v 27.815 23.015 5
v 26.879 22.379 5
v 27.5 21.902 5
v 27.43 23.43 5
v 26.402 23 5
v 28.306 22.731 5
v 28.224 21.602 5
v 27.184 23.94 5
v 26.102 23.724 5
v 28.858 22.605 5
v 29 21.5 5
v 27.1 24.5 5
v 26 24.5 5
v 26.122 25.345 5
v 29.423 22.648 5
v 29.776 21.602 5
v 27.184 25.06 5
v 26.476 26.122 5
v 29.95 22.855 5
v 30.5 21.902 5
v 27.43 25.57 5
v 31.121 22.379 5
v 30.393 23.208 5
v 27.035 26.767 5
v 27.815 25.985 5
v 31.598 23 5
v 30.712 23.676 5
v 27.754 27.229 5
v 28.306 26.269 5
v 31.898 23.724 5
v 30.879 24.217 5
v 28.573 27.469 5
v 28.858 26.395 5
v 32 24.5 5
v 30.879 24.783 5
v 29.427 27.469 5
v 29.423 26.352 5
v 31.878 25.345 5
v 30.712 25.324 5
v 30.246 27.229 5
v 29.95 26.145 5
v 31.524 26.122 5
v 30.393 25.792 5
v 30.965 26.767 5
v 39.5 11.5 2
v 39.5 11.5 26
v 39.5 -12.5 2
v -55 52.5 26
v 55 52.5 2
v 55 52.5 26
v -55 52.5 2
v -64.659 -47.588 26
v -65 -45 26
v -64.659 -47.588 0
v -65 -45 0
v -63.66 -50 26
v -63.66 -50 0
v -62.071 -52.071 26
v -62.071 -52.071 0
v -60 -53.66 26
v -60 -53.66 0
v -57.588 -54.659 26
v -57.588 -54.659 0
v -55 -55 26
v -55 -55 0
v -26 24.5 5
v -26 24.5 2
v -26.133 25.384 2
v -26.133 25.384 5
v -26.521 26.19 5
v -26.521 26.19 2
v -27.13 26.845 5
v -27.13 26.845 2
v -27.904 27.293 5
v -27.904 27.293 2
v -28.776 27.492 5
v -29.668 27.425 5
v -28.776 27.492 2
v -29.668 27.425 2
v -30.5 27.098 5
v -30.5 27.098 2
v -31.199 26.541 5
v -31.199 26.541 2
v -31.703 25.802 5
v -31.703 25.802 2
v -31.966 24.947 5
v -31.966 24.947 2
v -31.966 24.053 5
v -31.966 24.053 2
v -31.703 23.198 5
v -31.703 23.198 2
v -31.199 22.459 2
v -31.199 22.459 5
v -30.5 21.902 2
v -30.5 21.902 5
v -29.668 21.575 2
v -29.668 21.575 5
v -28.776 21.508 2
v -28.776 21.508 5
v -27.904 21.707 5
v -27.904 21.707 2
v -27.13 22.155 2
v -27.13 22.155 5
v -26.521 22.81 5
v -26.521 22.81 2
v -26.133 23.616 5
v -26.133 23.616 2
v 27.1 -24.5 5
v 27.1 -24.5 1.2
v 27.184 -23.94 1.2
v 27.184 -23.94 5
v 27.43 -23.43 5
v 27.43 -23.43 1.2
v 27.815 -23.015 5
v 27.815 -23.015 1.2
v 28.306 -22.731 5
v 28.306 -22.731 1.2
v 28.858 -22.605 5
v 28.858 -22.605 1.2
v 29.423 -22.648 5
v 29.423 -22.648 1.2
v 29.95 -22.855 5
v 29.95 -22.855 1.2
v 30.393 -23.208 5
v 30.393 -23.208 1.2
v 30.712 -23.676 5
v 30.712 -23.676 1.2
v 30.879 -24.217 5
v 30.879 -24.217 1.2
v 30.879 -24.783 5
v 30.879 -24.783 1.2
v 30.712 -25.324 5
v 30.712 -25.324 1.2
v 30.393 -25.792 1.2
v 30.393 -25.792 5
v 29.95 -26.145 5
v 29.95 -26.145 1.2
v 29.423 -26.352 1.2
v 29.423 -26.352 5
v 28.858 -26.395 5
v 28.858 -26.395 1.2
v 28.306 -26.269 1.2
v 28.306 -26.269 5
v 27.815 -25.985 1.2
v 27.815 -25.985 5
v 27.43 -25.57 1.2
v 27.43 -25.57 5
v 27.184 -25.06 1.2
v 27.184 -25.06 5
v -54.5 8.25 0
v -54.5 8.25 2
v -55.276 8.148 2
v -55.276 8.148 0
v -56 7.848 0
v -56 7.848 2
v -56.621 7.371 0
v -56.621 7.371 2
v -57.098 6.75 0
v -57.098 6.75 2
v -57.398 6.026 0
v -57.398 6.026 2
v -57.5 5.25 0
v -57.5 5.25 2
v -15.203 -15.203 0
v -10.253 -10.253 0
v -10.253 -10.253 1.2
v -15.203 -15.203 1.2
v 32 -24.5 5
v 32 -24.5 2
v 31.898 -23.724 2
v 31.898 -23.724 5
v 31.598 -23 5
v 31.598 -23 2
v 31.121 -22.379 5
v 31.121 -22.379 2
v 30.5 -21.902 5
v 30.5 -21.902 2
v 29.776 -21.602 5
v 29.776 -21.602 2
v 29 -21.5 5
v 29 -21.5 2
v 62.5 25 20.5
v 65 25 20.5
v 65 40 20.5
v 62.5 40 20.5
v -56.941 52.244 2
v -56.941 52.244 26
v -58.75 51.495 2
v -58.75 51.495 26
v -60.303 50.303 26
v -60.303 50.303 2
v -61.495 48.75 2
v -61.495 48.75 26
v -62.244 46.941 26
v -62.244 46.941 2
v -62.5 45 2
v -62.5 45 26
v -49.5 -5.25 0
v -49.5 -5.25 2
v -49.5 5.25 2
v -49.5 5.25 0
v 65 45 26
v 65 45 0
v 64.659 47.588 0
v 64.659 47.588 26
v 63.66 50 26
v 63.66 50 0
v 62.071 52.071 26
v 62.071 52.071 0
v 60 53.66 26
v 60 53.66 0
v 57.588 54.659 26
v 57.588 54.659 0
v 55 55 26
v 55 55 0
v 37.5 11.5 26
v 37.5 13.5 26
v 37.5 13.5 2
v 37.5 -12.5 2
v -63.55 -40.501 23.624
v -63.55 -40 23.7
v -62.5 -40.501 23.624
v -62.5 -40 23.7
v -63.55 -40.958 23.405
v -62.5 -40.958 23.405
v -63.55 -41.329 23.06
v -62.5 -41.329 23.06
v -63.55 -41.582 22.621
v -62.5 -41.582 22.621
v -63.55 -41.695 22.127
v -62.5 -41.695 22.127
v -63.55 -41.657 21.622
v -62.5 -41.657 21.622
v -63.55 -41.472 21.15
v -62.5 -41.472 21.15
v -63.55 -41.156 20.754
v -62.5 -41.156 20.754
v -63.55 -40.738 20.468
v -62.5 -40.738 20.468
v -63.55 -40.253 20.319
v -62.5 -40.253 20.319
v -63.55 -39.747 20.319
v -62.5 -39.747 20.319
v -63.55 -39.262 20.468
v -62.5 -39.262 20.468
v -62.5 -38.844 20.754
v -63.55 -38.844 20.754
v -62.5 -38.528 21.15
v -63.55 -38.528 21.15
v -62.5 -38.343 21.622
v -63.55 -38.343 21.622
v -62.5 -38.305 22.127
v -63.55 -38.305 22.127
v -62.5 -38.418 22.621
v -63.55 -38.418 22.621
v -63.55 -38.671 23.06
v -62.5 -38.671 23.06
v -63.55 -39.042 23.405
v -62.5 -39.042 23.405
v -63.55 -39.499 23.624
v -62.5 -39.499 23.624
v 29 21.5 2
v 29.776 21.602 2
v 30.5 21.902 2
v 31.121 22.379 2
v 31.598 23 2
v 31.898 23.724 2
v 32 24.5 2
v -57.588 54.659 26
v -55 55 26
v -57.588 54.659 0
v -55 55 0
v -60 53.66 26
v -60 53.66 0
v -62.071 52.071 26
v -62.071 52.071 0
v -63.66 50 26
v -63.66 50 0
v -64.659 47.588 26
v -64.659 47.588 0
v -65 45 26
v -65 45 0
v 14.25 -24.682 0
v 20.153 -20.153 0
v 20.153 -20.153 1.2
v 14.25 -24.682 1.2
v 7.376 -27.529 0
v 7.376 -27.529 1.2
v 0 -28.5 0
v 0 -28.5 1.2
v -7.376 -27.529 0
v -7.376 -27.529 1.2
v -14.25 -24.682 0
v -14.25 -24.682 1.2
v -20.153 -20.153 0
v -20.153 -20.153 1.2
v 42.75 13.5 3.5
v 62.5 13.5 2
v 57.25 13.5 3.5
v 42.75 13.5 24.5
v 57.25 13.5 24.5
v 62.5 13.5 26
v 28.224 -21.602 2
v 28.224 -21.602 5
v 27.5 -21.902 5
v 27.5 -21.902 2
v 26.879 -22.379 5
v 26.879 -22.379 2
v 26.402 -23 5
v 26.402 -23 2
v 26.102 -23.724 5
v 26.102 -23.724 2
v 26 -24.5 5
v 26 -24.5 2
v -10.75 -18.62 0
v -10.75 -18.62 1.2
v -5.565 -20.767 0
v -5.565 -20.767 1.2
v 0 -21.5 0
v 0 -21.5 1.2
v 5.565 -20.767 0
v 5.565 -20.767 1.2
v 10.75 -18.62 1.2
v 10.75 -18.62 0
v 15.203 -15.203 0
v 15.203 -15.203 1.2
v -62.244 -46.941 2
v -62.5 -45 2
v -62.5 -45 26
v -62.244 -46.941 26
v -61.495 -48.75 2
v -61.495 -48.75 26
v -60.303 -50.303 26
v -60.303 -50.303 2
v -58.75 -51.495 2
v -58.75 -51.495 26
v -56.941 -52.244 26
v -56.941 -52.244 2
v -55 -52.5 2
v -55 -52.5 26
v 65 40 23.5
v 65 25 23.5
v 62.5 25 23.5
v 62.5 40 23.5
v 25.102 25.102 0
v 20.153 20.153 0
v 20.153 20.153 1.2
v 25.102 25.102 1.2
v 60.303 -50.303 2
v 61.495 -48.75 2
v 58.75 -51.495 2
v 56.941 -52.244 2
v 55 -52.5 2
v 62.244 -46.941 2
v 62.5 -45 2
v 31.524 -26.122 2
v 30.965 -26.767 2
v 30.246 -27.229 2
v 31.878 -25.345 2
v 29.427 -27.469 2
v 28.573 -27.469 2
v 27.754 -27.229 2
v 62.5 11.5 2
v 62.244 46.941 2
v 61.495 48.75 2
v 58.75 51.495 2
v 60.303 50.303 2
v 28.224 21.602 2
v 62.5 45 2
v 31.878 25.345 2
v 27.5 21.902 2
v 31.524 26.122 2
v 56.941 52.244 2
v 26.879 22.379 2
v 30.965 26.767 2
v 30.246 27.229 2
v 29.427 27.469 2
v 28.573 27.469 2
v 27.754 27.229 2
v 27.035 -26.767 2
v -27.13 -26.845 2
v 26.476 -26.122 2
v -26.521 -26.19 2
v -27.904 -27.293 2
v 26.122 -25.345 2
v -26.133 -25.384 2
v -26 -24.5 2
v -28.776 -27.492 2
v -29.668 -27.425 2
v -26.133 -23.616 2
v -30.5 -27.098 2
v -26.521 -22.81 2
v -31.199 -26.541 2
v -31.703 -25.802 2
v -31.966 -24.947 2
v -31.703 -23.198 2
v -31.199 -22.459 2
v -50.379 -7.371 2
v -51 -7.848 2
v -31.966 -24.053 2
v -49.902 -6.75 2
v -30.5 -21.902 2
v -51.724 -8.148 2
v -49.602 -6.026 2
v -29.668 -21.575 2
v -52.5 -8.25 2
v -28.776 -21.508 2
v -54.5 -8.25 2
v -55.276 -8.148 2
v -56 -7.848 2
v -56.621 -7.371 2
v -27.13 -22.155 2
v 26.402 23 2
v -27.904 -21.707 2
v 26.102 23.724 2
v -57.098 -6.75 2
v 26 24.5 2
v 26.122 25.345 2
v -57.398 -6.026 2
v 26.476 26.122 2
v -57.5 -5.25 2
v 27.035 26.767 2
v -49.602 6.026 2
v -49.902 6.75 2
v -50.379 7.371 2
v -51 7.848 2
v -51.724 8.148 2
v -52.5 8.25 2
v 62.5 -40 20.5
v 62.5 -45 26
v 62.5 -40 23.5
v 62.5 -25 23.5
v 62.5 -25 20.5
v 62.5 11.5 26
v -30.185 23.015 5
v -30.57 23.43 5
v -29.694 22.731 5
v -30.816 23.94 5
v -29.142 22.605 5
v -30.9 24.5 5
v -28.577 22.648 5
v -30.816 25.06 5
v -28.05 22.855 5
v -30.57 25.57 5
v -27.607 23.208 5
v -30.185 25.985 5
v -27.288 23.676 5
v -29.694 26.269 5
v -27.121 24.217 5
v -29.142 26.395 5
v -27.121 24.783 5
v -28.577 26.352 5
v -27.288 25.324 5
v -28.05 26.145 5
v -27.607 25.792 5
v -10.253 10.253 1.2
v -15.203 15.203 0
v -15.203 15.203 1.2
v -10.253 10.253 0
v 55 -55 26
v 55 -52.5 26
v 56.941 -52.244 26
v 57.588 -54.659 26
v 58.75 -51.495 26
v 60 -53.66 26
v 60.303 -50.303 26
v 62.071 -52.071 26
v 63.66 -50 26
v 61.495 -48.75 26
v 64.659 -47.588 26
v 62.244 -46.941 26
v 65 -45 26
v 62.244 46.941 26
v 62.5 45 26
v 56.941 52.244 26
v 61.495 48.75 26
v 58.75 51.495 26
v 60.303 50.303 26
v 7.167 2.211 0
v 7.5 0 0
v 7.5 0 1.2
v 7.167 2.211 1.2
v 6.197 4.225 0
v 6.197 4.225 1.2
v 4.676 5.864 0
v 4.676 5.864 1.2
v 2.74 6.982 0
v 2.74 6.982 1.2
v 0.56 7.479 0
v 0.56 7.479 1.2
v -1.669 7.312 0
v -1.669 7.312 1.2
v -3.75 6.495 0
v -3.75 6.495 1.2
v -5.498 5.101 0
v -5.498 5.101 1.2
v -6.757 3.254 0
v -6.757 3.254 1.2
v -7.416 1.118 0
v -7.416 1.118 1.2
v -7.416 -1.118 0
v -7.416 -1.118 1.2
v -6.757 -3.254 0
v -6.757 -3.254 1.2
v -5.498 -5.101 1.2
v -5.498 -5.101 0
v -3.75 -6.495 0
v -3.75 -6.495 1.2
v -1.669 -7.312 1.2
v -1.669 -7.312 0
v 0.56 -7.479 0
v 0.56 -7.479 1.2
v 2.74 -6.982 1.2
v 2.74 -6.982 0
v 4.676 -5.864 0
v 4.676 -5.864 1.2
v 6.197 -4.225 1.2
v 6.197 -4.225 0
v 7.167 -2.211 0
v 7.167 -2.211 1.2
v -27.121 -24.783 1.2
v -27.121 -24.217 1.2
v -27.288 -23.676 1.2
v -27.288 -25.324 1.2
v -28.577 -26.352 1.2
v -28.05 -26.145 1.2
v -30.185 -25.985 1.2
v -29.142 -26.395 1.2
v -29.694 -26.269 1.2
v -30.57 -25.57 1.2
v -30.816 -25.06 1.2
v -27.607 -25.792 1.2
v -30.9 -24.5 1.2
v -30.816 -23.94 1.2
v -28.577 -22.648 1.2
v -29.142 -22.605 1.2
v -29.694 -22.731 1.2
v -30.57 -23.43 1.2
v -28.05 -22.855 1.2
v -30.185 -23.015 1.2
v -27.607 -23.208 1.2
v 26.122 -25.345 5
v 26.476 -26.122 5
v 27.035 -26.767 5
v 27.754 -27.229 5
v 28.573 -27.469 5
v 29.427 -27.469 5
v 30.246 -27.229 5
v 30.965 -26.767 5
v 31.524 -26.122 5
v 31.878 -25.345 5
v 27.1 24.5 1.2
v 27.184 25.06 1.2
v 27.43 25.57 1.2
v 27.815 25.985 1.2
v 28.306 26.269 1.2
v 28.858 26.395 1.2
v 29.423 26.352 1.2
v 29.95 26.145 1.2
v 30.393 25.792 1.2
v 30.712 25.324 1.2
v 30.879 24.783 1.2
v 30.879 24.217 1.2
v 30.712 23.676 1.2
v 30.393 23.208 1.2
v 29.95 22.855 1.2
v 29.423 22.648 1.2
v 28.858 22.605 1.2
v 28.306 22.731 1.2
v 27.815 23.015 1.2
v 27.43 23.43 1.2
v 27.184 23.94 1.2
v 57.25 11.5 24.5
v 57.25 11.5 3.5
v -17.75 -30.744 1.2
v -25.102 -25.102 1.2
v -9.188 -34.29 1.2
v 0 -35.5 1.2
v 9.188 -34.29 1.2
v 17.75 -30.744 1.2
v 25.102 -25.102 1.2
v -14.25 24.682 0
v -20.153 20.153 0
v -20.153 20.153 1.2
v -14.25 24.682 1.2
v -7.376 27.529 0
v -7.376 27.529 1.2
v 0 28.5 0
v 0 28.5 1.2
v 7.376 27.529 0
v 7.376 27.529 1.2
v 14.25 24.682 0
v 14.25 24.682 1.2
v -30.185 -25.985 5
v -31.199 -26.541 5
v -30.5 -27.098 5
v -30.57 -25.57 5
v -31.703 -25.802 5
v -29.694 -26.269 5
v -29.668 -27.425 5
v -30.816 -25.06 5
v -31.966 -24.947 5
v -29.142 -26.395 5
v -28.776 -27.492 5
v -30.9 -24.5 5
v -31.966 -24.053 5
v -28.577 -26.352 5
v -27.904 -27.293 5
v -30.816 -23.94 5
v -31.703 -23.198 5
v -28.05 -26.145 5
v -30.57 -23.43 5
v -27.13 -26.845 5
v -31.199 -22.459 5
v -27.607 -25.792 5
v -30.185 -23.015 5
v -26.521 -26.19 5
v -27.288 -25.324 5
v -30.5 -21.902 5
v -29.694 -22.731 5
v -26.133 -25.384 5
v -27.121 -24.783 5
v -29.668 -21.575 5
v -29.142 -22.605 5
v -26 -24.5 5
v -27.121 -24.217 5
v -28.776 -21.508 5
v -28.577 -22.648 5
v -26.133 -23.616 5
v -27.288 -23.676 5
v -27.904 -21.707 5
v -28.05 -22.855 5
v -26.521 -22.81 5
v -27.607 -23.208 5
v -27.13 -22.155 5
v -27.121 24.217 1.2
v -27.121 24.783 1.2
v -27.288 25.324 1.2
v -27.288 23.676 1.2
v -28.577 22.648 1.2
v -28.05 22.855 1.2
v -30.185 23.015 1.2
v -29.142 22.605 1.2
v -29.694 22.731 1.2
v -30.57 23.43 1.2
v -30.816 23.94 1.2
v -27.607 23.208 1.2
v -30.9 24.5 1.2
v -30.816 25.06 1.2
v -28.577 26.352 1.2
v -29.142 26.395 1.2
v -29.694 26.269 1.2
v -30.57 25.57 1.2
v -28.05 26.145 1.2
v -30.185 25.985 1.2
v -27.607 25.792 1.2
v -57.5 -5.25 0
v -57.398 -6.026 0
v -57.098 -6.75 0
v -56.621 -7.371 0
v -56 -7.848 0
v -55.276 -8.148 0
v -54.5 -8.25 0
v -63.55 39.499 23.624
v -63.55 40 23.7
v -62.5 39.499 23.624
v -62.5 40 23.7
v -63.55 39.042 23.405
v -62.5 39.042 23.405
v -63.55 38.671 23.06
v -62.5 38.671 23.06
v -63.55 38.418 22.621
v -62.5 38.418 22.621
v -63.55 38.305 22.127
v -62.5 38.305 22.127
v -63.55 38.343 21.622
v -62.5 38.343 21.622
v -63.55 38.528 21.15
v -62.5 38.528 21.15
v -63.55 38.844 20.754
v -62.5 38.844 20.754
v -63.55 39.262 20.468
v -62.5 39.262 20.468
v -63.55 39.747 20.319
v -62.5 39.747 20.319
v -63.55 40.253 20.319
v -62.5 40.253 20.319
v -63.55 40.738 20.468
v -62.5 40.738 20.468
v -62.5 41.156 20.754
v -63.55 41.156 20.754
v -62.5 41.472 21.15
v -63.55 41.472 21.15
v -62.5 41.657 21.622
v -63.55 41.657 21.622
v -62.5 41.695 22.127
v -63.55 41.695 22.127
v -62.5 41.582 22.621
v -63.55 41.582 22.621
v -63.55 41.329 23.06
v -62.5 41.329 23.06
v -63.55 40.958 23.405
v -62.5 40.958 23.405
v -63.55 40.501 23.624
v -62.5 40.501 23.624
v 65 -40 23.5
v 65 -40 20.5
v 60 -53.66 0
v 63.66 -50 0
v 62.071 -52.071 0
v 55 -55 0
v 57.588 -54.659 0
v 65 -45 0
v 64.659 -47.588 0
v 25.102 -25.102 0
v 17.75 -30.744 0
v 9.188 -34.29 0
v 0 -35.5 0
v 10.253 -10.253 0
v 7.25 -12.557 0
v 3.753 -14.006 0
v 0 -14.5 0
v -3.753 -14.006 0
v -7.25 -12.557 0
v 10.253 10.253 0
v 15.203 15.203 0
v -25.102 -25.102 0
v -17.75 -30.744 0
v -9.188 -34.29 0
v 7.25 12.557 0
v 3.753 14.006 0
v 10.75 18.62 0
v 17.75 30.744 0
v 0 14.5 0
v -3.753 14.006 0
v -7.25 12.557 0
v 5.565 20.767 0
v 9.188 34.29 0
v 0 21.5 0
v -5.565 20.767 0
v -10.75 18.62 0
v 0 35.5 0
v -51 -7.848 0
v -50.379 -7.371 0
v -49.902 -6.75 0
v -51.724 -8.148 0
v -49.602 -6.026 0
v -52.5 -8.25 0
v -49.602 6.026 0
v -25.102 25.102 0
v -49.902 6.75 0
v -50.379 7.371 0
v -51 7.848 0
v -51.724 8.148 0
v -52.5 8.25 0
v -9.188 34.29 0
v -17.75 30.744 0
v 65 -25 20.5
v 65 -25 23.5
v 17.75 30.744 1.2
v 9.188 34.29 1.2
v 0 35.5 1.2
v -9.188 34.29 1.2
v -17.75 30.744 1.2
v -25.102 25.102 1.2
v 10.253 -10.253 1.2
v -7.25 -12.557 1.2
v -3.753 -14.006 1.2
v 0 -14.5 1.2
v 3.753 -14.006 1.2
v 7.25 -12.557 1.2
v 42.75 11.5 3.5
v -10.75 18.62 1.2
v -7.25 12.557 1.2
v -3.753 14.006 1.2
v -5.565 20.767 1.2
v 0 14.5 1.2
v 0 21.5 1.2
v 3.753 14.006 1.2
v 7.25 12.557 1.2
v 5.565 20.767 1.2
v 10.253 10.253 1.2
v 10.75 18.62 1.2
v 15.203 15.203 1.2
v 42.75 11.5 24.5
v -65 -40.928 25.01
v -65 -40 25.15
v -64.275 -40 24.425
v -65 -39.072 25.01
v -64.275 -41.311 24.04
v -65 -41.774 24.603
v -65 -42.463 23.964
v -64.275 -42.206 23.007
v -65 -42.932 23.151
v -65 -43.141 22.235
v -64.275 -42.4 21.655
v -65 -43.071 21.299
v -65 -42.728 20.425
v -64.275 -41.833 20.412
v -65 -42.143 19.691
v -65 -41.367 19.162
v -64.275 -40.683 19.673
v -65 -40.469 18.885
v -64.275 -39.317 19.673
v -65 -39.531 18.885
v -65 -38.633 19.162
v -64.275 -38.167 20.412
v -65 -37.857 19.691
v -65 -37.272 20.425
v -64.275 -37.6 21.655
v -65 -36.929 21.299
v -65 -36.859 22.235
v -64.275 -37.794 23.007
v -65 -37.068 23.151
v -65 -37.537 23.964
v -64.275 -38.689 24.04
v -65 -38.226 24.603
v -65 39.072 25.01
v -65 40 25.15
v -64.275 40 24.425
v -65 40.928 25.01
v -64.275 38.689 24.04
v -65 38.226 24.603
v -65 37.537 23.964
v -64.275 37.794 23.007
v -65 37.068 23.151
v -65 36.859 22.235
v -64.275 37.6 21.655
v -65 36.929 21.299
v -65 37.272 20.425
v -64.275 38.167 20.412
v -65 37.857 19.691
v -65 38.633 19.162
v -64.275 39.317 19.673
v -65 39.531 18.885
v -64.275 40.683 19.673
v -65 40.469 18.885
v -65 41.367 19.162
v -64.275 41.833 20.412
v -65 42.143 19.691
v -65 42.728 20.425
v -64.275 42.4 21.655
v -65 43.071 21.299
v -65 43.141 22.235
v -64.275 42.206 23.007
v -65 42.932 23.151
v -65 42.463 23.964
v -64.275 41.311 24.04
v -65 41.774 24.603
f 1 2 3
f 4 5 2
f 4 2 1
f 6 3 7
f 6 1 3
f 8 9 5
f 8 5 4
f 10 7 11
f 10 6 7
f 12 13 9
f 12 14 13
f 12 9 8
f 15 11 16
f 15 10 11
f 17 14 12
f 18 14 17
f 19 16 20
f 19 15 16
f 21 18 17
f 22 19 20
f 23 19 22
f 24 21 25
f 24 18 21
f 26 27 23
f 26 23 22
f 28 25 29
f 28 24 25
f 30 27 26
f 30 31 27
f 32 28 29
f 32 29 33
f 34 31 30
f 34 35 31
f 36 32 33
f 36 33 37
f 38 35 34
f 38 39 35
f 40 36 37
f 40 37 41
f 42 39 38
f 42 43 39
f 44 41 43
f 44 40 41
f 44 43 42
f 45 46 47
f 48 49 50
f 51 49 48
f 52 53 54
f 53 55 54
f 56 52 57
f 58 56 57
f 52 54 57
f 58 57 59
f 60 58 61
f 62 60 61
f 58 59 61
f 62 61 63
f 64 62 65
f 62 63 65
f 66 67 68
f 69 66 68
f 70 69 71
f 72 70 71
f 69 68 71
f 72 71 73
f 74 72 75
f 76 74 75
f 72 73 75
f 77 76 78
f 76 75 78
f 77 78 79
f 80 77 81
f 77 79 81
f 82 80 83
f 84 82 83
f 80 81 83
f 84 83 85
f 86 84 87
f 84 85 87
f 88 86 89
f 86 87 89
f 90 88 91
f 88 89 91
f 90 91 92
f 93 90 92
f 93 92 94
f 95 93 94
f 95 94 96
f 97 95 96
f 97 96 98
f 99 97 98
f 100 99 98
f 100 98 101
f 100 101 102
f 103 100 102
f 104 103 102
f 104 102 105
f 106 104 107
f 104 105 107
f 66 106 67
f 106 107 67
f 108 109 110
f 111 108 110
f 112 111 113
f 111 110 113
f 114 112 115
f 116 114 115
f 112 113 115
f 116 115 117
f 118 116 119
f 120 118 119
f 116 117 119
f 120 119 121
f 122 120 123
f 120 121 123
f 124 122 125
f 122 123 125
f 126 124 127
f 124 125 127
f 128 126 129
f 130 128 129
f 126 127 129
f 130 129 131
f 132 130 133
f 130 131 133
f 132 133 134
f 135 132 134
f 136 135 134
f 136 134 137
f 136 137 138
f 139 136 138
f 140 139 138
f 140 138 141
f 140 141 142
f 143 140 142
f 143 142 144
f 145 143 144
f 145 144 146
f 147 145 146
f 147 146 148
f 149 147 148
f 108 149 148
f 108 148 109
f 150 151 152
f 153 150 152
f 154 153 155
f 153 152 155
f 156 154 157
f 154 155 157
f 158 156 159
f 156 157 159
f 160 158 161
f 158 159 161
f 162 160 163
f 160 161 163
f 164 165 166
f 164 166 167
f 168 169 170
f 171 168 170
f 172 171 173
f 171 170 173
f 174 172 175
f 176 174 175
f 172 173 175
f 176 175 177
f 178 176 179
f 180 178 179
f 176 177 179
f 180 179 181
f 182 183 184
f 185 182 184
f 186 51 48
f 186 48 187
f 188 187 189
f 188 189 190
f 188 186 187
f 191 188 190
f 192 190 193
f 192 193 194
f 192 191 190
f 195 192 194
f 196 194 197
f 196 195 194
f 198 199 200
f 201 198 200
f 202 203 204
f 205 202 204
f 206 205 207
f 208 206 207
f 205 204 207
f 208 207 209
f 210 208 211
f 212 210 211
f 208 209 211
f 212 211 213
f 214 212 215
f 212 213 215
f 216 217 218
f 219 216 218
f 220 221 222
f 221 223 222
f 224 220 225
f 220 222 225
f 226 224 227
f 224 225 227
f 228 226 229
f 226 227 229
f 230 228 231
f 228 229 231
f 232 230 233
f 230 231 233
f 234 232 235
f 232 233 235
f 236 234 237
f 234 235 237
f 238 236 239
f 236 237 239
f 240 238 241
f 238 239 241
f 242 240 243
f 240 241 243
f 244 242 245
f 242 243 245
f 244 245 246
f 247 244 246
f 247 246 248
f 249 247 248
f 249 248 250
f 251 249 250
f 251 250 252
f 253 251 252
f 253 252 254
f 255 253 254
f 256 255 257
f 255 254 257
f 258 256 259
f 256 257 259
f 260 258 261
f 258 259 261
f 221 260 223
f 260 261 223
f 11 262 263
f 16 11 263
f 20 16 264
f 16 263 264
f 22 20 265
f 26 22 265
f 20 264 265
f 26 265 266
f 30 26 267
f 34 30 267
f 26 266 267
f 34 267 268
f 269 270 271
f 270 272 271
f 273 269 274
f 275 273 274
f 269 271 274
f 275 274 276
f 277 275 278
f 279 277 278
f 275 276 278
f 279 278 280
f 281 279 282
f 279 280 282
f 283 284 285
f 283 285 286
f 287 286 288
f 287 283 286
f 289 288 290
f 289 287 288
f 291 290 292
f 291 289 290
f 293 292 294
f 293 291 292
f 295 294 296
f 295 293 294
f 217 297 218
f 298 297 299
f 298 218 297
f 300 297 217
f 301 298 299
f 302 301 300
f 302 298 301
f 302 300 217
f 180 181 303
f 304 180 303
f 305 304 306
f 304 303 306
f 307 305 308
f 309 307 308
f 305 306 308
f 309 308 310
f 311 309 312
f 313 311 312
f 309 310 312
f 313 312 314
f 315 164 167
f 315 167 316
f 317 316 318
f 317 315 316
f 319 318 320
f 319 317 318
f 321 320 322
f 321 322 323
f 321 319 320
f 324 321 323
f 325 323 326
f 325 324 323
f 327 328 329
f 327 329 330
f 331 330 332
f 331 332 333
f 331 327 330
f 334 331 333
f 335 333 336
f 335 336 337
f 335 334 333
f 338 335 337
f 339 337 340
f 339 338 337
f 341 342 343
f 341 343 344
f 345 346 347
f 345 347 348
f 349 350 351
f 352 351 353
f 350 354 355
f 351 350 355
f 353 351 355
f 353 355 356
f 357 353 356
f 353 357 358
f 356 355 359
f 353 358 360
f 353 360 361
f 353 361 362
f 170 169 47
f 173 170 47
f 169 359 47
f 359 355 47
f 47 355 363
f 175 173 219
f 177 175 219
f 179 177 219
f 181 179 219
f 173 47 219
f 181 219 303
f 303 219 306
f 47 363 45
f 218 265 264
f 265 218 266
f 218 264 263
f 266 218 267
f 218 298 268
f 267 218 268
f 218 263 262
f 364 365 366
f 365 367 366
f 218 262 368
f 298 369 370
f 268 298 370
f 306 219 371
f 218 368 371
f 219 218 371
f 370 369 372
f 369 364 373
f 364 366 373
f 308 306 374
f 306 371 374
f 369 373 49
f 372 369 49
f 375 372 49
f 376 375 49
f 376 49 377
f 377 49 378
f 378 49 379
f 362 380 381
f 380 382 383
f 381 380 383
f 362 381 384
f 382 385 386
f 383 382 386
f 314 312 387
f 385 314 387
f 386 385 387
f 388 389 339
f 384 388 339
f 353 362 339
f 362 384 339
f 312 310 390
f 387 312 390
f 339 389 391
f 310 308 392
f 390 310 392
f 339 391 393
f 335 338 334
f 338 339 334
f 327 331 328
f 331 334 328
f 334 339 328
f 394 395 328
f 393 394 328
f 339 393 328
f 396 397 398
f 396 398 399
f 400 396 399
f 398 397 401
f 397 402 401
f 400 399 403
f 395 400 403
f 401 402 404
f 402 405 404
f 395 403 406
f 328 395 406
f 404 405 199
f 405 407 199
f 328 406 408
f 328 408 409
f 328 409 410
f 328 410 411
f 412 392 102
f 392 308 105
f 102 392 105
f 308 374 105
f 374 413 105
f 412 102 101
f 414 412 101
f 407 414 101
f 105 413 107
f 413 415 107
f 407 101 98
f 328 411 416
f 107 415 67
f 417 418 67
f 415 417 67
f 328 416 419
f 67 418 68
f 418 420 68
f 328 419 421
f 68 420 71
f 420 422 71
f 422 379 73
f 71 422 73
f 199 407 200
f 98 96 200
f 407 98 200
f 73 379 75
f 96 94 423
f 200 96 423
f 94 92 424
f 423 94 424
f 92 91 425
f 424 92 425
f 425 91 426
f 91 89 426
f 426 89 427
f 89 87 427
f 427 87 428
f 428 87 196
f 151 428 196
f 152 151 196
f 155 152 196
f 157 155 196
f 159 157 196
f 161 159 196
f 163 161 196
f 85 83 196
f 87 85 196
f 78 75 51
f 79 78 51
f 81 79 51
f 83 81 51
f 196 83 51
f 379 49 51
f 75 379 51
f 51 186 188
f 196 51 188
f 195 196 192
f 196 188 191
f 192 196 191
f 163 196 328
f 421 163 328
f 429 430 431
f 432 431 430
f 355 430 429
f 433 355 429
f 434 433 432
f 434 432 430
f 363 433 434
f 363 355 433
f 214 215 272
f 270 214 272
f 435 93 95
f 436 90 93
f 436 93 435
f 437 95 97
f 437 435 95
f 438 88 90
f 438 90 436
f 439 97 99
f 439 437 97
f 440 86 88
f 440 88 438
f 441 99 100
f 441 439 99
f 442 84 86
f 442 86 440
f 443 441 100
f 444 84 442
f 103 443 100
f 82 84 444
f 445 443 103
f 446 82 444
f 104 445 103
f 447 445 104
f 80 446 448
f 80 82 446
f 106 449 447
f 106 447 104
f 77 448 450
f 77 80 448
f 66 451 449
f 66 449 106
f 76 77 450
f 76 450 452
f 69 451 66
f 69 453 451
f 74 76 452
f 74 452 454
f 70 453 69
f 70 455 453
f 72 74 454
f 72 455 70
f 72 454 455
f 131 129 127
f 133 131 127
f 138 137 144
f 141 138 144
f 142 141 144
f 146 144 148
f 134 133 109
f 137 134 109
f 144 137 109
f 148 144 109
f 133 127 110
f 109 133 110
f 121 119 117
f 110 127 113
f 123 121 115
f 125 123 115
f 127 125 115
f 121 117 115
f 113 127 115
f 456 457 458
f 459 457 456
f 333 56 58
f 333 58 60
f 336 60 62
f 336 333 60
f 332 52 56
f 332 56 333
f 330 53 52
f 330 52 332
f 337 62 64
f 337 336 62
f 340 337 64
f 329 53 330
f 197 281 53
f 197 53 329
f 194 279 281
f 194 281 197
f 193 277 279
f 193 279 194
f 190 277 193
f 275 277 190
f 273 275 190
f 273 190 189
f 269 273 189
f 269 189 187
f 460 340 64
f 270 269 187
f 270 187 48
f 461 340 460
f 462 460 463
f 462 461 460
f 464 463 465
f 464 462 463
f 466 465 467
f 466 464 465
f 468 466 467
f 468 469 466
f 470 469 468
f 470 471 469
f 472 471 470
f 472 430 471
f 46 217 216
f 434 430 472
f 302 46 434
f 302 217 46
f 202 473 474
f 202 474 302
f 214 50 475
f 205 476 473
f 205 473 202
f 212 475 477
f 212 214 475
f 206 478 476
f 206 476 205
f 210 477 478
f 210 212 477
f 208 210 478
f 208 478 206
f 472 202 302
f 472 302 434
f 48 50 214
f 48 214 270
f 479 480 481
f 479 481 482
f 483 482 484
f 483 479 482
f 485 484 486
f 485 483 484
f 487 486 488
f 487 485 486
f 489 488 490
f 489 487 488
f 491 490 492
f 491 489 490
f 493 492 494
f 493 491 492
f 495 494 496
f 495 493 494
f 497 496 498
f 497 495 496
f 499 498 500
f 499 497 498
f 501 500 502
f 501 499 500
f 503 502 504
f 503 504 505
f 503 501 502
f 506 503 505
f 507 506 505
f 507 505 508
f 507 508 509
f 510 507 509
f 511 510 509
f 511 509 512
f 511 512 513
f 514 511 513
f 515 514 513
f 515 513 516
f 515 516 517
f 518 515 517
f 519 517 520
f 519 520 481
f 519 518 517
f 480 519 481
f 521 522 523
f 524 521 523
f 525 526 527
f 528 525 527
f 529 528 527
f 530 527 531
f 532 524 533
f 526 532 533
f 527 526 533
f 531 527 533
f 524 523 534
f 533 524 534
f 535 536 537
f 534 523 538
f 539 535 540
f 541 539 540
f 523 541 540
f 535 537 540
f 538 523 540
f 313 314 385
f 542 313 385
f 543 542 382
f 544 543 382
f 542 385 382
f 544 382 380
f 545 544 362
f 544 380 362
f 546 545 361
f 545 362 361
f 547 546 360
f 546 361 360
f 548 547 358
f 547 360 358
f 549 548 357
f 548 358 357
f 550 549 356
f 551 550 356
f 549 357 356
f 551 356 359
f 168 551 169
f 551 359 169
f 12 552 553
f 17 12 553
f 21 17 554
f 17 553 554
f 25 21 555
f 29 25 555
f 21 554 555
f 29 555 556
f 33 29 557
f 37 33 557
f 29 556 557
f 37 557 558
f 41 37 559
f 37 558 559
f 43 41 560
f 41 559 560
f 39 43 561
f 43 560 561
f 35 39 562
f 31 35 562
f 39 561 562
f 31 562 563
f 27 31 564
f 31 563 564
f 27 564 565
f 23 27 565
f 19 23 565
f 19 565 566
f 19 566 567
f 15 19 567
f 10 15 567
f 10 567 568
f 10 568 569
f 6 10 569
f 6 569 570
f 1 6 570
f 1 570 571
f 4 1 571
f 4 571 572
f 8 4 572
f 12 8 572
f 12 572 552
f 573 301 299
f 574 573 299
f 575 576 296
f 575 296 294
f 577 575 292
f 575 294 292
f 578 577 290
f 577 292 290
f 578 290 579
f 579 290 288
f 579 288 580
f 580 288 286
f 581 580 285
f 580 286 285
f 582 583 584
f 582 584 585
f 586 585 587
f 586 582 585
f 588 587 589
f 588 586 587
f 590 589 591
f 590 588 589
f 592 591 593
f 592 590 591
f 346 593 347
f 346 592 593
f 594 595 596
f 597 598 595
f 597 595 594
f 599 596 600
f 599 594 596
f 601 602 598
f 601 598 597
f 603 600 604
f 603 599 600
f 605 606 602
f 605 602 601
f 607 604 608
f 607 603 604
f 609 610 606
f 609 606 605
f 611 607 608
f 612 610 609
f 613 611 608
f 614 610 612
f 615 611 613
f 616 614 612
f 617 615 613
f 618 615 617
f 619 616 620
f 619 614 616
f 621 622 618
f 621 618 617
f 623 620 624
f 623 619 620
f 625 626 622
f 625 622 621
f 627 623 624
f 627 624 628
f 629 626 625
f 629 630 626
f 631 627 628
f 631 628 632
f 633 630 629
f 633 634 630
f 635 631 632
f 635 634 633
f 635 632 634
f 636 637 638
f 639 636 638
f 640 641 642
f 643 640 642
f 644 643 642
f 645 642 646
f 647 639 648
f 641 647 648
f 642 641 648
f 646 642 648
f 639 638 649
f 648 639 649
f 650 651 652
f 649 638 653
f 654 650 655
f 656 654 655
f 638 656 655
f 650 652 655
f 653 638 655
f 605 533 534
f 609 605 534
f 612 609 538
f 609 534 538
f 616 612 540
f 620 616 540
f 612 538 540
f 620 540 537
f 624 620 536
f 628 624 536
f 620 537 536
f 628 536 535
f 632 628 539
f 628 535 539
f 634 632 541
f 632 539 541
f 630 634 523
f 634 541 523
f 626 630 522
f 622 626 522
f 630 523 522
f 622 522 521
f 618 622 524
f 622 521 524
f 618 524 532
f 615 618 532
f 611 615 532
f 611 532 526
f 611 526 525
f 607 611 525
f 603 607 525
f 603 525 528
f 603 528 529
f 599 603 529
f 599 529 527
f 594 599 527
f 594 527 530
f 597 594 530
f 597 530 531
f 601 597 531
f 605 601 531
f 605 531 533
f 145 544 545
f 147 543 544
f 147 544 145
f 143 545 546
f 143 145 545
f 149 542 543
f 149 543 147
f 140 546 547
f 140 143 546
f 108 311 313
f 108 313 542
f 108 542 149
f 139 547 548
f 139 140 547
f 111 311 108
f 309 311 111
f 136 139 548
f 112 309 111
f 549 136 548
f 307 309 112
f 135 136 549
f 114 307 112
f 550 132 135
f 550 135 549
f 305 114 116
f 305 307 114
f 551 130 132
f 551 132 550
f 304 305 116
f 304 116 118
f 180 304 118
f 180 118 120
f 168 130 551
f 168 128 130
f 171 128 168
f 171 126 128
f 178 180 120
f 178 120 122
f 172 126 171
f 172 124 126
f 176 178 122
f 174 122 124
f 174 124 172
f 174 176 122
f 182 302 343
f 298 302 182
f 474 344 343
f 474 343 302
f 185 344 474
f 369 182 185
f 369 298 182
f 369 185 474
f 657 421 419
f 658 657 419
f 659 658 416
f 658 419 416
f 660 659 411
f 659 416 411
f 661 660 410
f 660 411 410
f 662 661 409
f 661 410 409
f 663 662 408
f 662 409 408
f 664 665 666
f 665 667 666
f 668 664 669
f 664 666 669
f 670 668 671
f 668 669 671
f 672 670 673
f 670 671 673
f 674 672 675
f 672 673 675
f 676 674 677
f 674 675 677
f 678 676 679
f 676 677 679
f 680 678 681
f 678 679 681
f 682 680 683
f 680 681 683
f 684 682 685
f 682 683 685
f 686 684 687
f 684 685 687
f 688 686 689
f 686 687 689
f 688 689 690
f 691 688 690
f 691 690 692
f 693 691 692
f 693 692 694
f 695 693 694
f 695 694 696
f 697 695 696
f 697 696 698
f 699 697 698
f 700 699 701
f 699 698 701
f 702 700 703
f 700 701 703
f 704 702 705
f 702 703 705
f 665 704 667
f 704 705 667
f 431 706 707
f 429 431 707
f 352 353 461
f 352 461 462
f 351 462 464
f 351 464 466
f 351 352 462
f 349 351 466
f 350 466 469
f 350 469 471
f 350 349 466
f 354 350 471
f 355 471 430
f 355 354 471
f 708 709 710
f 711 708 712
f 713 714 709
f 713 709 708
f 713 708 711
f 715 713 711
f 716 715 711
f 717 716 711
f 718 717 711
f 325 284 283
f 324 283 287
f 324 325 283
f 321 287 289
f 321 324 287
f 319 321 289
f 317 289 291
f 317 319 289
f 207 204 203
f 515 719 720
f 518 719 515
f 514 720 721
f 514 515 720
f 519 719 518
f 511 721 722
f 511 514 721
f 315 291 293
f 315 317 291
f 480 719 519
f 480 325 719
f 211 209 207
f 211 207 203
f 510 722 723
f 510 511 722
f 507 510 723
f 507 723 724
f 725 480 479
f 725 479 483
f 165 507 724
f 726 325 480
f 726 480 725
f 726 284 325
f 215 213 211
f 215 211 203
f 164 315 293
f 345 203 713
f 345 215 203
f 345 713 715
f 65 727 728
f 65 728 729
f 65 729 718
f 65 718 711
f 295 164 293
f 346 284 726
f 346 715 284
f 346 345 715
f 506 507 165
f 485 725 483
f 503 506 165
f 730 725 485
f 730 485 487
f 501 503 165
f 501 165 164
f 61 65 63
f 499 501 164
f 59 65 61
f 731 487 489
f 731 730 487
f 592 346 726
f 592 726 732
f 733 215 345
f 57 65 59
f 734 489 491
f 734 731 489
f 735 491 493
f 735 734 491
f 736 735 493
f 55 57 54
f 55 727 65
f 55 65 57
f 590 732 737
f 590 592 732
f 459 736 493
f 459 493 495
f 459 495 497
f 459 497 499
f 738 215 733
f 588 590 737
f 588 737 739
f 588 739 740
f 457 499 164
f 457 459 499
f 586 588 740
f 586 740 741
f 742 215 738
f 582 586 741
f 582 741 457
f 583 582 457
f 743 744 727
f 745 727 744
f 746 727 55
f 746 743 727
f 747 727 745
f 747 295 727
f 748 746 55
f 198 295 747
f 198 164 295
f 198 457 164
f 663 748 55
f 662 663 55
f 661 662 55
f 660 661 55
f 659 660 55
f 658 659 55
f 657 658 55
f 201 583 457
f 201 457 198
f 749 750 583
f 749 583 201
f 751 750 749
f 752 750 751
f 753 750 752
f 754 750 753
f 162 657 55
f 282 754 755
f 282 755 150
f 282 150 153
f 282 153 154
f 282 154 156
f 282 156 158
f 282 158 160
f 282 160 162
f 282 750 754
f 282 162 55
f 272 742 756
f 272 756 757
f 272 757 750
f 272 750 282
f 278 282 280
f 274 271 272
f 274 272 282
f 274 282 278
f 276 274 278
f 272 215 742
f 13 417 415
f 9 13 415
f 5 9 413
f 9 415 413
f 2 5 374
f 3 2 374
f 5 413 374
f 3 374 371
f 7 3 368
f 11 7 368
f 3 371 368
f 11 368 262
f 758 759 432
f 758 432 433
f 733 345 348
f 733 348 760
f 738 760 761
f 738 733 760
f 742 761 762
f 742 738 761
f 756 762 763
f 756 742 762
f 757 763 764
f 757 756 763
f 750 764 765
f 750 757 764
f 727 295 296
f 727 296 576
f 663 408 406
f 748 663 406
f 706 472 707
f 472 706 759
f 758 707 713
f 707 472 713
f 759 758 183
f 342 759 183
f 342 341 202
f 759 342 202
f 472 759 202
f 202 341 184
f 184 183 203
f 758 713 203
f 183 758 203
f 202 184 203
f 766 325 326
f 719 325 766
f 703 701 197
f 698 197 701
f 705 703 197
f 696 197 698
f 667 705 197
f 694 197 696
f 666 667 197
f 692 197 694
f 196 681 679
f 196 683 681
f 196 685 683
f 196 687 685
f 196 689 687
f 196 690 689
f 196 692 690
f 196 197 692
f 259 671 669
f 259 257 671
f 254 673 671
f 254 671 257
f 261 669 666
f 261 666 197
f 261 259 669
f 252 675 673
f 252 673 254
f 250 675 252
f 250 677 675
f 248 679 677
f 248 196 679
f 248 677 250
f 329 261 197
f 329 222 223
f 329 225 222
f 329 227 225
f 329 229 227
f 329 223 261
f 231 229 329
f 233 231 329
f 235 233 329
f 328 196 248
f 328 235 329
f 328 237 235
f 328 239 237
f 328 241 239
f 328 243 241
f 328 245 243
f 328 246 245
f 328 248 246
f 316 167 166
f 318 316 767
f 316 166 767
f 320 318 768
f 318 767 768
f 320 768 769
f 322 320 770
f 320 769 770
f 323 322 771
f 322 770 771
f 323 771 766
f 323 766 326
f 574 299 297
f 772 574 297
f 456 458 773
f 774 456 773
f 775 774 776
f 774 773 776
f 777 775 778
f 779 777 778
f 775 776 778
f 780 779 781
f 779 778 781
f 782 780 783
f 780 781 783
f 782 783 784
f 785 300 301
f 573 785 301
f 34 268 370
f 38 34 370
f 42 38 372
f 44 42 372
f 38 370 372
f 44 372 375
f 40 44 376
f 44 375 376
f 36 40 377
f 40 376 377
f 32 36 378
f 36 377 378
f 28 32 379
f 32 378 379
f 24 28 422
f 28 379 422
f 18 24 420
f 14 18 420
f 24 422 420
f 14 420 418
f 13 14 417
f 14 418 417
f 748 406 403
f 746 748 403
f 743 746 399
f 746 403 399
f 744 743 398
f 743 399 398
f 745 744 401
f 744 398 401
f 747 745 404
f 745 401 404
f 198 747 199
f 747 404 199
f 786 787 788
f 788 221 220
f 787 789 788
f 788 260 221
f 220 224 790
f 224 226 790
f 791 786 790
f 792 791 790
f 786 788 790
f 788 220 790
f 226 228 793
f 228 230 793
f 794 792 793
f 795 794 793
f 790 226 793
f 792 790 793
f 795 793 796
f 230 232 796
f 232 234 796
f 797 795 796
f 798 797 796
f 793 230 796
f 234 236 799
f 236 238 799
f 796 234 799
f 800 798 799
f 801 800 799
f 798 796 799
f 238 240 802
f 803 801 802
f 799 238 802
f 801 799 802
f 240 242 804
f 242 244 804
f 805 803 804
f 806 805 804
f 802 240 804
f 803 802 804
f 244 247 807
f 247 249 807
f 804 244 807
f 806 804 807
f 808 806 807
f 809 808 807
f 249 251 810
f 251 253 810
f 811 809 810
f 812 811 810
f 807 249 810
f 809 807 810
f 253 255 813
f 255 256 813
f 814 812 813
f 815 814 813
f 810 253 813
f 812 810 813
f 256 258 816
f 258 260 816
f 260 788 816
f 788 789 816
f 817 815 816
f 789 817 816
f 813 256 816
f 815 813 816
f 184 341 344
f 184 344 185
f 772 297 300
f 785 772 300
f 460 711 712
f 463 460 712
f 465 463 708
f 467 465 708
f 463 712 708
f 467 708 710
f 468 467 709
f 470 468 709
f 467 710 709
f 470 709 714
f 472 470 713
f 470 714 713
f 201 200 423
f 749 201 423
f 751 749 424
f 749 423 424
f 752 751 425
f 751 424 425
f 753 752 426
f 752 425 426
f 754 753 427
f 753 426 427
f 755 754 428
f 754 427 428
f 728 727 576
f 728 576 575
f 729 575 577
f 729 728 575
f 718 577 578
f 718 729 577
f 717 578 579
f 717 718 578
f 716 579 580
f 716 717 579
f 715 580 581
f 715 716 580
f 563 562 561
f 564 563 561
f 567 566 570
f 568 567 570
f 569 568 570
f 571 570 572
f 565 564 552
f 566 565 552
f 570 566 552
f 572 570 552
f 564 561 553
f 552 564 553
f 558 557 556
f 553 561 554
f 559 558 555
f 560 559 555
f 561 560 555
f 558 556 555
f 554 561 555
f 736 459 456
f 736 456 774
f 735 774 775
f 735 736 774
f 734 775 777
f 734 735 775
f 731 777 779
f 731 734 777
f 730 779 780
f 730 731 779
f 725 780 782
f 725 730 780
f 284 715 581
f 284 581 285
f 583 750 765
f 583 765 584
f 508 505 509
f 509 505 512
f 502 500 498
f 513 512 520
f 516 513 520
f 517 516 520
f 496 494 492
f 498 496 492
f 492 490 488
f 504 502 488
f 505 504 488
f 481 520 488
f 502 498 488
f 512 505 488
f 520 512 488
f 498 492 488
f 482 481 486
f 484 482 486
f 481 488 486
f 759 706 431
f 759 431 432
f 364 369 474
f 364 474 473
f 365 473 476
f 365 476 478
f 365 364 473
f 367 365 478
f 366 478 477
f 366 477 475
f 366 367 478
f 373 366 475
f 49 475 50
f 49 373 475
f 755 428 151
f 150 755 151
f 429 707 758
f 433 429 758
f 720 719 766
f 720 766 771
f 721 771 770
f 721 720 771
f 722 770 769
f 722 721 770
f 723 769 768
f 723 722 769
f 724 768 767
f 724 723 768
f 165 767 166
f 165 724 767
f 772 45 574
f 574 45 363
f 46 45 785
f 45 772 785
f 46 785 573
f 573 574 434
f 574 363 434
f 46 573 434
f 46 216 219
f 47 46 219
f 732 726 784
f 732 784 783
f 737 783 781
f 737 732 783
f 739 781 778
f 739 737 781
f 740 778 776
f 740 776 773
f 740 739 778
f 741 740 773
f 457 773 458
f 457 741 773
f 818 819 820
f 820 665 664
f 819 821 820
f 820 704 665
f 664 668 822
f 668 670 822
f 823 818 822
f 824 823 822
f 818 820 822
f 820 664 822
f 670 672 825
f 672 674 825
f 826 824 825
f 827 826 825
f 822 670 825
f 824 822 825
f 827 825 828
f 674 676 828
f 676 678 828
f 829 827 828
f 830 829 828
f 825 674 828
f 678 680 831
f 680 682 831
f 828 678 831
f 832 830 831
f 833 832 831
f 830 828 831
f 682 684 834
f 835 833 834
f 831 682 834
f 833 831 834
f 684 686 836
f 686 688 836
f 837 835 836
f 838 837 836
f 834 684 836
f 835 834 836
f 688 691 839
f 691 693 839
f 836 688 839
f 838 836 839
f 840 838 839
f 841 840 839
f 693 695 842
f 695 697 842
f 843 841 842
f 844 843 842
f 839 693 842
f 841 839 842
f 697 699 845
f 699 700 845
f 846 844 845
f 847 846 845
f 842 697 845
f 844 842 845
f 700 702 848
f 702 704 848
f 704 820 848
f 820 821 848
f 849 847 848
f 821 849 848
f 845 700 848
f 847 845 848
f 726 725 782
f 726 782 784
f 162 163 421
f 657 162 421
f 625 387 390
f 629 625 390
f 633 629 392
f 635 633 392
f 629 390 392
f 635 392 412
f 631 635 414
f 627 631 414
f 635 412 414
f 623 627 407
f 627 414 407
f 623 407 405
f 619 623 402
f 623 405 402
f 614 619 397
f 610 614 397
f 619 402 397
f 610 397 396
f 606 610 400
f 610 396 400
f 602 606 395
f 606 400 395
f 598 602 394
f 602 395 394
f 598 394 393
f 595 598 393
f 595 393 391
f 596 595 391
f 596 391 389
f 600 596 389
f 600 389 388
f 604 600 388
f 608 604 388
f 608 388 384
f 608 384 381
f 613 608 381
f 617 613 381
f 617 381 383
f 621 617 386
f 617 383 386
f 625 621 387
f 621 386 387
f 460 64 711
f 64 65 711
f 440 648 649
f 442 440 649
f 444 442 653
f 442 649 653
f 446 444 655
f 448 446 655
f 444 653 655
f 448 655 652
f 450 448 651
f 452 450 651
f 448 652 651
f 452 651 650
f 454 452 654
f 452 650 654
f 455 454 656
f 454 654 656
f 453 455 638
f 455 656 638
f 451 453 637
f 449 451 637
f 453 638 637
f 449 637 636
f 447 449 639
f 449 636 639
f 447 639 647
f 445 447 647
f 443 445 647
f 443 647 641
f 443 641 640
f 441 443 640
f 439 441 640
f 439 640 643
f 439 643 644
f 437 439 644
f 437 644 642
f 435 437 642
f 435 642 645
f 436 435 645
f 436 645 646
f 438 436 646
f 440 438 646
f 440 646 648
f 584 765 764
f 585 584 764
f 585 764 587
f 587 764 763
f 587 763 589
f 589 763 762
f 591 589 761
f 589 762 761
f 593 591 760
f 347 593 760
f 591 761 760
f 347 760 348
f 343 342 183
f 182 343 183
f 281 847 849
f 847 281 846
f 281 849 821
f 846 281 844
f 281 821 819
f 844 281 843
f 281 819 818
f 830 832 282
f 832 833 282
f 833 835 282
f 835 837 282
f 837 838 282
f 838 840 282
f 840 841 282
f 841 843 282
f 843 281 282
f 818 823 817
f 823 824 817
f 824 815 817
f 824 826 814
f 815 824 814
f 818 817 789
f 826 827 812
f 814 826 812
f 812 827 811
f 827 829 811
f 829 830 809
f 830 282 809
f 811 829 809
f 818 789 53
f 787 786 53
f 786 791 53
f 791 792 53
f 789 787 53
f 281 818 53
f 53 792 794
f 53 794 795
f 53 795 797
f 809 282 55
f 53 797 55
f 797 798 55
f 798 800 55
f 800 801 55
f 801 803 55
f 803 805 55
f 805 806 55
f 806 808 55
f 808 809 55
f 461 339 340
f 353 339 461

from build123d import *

# Parameters (mm, degrees)
P_IDAT_VYSUNUT_M1_DEPTH                           = 2
P_IDAT_VYSUNUT_M2_DEPTH                           = 24
SKICA6_R                                          = 3
P_IDAT_VYSUNUT_M3_DEPTH                           = 3
D_RY_PRO_KOL_K_VELIKOST_MM1_D                     = 3.8
D_RY_PRO_KOL_K_VELIKOST_MM1_DEPTH                 = 3.8
ODEBRAT_VYSUNUT_M1_DEPTH                          = 3
SKICA12_W                                         = 24
SKICA12_H                                         = 2
P_IDAT_VYSUNUT_M4_DEPTH                           = 25
P_IDAT_VYSUNUT_M5_DEPTH                           = 2
SKICA14_W                                         = 7.25
SKICA14_H                                         = 10.5
ODEBRAT_VYSUNUT_M2_DEPTH                          = 9.212713479
V_LCOV_ZAHLOUBEN_PRO_M3_ROUBY_S_PLOCH_D           = 3.4
V_LCOV_ZAHLOUBEN_PRO_M3_ROUBY_S_PLOCH_DEPTH       = 3.8
V_LCOV_ZAHLOUBEN_PRO_M3_ROUBY_S_PLOCH_CSINK_D     = 6.3
V_LCOV_ZAHLOUBEN_PRO_M3_ROUBY_S_PLOCH_CSINK_ANGLE = 90
V_LCOV_ZAHLOUBEN_PRO_M3_ROUBY_S_PLOCH_TIP         = 1.021463052
SKICA17_W                                         = 3
SKICA17_H                                         = 15
ODEBRAT_VYSUNUT_M3_DEPTH                          = 9.212713479
DUTINA1_OUTLINE_R                                 = 7.5
DUTINA1_DEPTH                                     = 1.2


# Read off the part's stored shape, not the designer's step: Dutina1
with BuildPart() as part:
    # Skica1 → Přidat vysunutím1 (new body)
    with BuildSketch(Plane.XY):
        with BuildLine():
            Line((-55, 55), (55, 55))
            ThreePointArc((55, 55), (62.071067812, 52.071067812), (65, 45))
            Line((65, 45), (65, -45))
            ThreePointArc((65, -45), (62.071067812, -52.071067812), (55, -55))
            Line((55, -55), (-55, -55))
            ThreePointArc((-55, -55), (-62.071067812, -52.071067812), (-65, -45))
            Line((-65, -45), (-65, 45))
            ThreePointArc((-65, 45), (-62.071067812, 52.071067812), (-55, 55))
        make_face()
    extrude(amount=P_IDAT_VYSUNUT_M1_DEPTH)

    # Skica2 → Přidat vysunutím2 (add)
    with BuildSketch(Plane.XY.offset(2)):
        with BuildLine():
            Line((55, 55), (-55, 55))
            ThreePointArc((-55, 55), (-62.071067812, 52.071067812), (-65, 45))
            Line((-65, 45), (-65, -45))
            ThreePointArc((-65, -45), (-62.071067812, -52.071067812), (-55, -55))
            Line((-55, -55), (55, -55))
            ThreePointArc((55, -55), (62.071067812, -52.071067812), (65, -45))
            Line((65, -45), (65, 45))
            ThreePointArc((65, 45), (62.071067812, 52.071067812), (55, 55))
        make_face()
        with BuildLine():
            Line((-55, -52.5), (55, -52.5))
            ThreePointArc((55, -52.5), (60.303300859, -50.303300859), (62.5, -45))
            Line((62.5, -45), (62.5, 45))
            ThreePointArc((62.5, 45), (60.303300859, 50.303300859), (55, 52.5))
            Line((55, 52.5), (-55, 52.5))
            ThreePointArc((-55, 52.5), (-60.303300859, 50.303300859), (-62.5, 45))
            Line((-62.5, 45), (-62.5, -45))
            ThreePointArc((-62.5, -45), (-60.303300859, -50.303300859), (-55, -52.5))
        make_face(mode=Mode.SUBTRACT)
    extrude(amount=P_IDAT_VYSUNUT_M2_DEPTH)

    # Skica6 → Přidat vysunutím3 (add)
    with BuildSketch(Plane.XY.offset(2)):
        with BuildLine():
            ThreePointArc((29, -21.5), (26.878679656, -22.378679656), (26, -24.5))
            Line((26, -24.5), (29, -24.5))
            Line((29, -24.5), (29, -21.5))
        make_face()
        with BuildLine():
            Line((29, -24.5), (26, -24.5))
            ThreePointArc((26, -24.5), (29, -27.5), (32, -24.5))
            ThreePointArc((32, -24.5), (31.121320344, -22.378679656), (29, -21.5))
            Line((29, -21.5), (29, -24.5))
        make_face()
        with BuildLine():
            ThreePointArc((26, 24.5), (26.878679656, 22.378679656), (29, 21.5))
            Line((29, 21.5), (29, 24.5))
            Line((29, 24.5), (26, 24.5))
        make_face()
        with BuildLine():
            Line((29, 24.5), (29, 21.5))
            ThreePointArc((29, 21.5), (31.121320344, 22.378679656), (32, 24.5))
            ThreePointArc((32, 24.5), (29, 27.5), (26, 24.5))
            Line((26, 24.5), (29, 24.5))
        make_face()
        with Locations((-29, 24.5)):
            Circle(SKICA6_R)
        with Locations((-29, -24.5)):
            Circle(SKICA6_R)
    extrude(amount=P_IDAT_VYSUNUT_M3_DEPTH)

    # Díry pro kolík, velikost mm1
    with Locations(Plane.XY.offset(5)):
        with Locations((29, 24.5), (29, -24.5), (-29, -24.5), (-29, 24.5)):
            Hole(D_RY_PRO_KOL_K_VELIKOST_MM1_D / 2, depth=D_RY_PRO_KOL_K_VELIKOST_MM1_DEPTH)

    # Skica11 → Odebrat vysunutím1 (cut)
    with BuildSketch(Plane.XY.offset(2)):
        with BuildLine():
            Line((-49.5, 0), (-57.5, 0))
            Line((-57.5, 0), (-57.5, -5.25))
            ThreePointArc((-57.5, -5.25), (-56.621320344, -7.371320344), (-54.5, -8.25))
            Line((-54.5, -8.25), (-52.5, -8.25))
            ThreePointArc((-52.5, -8.25), (-50.378679656, -7.371320344), (-49.5, -5.25))
            Line((-49.5, -5.25), (-49.5, 0))
        make_face()
        with BuildLine():
            Line((-57.5, 5.25), (-57.5, 0))
            Line((-57.5, 0), (-49.5, 0))
            Line((-49.5, 0), (-49.5, 5.25))
            ThreePointArc((-49.5, 5.25), (-50.378679656, 7.371320344), (-52.5, 8.25))
            Line((-52.5, 8.25), (-54.5, 8.25))
            ThreePointArc((-54.5, 8.25), (-56.621320344, 7.371320344), (-57.5, 5.25))
        make_face()
    extrude(amount=-ODEBRAT_VYSUNUT_M1_DEPTH, mode=Mode.SUBTRACT)

    # Skica12 → Přidat vysunutím4 (add)
    with BuildSketch(Plane.ZY.offset(-62.5)):
        with Locations((14, 12.5)):
            Rectangle(SKICA12_W, SKICA12_H)
    extrude(amount=P_IDAT_VYSUNUT_M4_DEPTH)

    # Skica13 → Přidat vysunutím5 (add)
    with BuildSketch(Plane.ZY.offset(-37.5)):
        Polygon((2, -12.5), (2, 11.5), (26, 11.5), align=None)
    extrude(amount=-P_IDAT_VYSUNUT_M5_DEPTH)

    # Skica14 → Odebrat vysunutím2 (cut)
    with BuildSketch(Plane(origin=(0, 13.5, 0), x_dir=(1, 0, 0), z_dir=(0, 1, 0))):
        with Locations((46.375, -8.75)):
            Rectangle(SKICA14_W, SKICA14_H)
        with Locations((53.625, -8.75)):
            Rectangle(SKICA14_W, SKICA14_H)
        with Locations((53.625, -19.25)):
            Rectangle(SKICA14_W, SKICA14_H)
        with Locations((46.375, -19.25)):
            Rectangle(SKICA14_W, SKICA14_H)
    extrude(amount=-ODEBRAT_VYSUNUT_M2_DEPTH, mode=Mode.SUBTRACT)

    # Válcové zahloubení pro M3 šrouby s plochou hlavou1
    with Locations(Plane(origin=(-65, 40, 22), x_dir=(0, 0, -1), z_dir=(-1, 0, 0))):
        with Locations((0, 0), (0, 80)):
            CounterSinkHole(V_LCOV_ZAHLOUBEN_PRO_M3_ROUBY_S_PLOCH_D / 2, V_LCOV_ZAHLOUBEN_PRO_M3_ROUBY_S_PLOCH_CSINK_D / 2, depth=V_LCOV_ZAHLOUBEN_PRO_M3_ROUBY_S_PLOCH_DEPTH, counter_sink_angle=V_LCOV_ZAHLOUBEN_PRO_M3_ROUBY_S_PLOCH_CSINK_ANGLE)
            with Locations((0, 0, -(V_LCOV_ZAHLOUBEN_PRO_M3_ROUBY_S_PLOCH_DEPTH + V_LCOV_ZAHLOUBEN_PRO_M3_ROUBY_S_PLOCH_TIP / 2))):  # 118° drill point
                Cone(0, V_LCOV_ZAHLOUBEN_PRO_M3_ROUBY_S_PLOCH_D / 2, V_LCOV_ZAHLOUBEN_PRO_M3_ROUBY_S_PLOCH_TIP, mode=Mode.SUBTRACT)

    # Skica17 → Odebrat vysunutím3 (cut)
    with BuildSketch(Plane(origin=(65, 0, 0), x_dir=(0, 0, -1), z_dir=(1, 0, 0))):
        with Locations((-22, 32.5)):
            Rectangle(SKICA17_W, SKICA17_H)
        with Locations((-22, -32.5)):
            Rectangle(SKICA17_W, SKICA17_H)
    extrude(amount=-ODEBRAT_VYSUNUT_M3_DEPTH, mode=Mode.SUBTRACT)

    # Dutina1 outline → Dutina1 (cut)
    with BuildSketch(Plane.XY):
        Circle(DUTINA1_OUTLINE_R)
        with BuildLine():
            Line((10.253048327, 10.253048327), (15.202795796, 15.202795796))
            ThreePointArc((15.202795796, 15.202795796), (0, 21.5), (-15.202795796, 15.202795796))
            Line((-15.202795796, 15.202795796), (-10.253048327, 10.253048327))
            ThreePointArc((-10.253048327, 10.253048327), (0, 14.5), (10.253048327, 10.253048327))
        make_face()
        with BuildLine():
            Line((20.152543264, 20.152543264), (25.102290732, 25.102290732))
            ThreePointArc((25.102290732, 25.102290732), (0, 35.5), (-25.102290732, 25.102290732))
            Line((-25.102290732, 25.102290732), (-20.152543264, 20.152543264))
            ThreePointArc((-20.152543264, 20.152543264), (0, 28.5), (20.152543264, 20.152543264))
        make_face()
        with BuildLine():
            ThreePointArc((-15.202795796, -15.202795796), (0, -21.5), (15.202795796, -15.202795796))
            Line((15.202795796, -15.202795796), (10.253048327, -10.253048327))
            ThreePointArc((10.253048327, -10.253048327), (0, -14.5), (-10.253048327, -10.253048327))
            Line((-10.253048327, -10.253048327), (-15.202795796, -15.202795796))
        make_face()
        with BuildLine():
            Line((-20.152543264, -20.152543264), (-25.102290732, -25.102290732))
            ThreePointArc((-25.102290732, -25.102290732), (0, -35.5), (25.102290732, -25.102290732))
            Line((25.102290732, -25.102290732), (20.152543264, -20.152543264))
            ThreePointArc((20.152543264, -20.152543264), (0, -28.5), (-20.152543264, -20.152543264))
        make_face()
    extrude(amount=DUTINA1_DEPTH, mode=Mode.SUBTRACT)


solid = part.part
